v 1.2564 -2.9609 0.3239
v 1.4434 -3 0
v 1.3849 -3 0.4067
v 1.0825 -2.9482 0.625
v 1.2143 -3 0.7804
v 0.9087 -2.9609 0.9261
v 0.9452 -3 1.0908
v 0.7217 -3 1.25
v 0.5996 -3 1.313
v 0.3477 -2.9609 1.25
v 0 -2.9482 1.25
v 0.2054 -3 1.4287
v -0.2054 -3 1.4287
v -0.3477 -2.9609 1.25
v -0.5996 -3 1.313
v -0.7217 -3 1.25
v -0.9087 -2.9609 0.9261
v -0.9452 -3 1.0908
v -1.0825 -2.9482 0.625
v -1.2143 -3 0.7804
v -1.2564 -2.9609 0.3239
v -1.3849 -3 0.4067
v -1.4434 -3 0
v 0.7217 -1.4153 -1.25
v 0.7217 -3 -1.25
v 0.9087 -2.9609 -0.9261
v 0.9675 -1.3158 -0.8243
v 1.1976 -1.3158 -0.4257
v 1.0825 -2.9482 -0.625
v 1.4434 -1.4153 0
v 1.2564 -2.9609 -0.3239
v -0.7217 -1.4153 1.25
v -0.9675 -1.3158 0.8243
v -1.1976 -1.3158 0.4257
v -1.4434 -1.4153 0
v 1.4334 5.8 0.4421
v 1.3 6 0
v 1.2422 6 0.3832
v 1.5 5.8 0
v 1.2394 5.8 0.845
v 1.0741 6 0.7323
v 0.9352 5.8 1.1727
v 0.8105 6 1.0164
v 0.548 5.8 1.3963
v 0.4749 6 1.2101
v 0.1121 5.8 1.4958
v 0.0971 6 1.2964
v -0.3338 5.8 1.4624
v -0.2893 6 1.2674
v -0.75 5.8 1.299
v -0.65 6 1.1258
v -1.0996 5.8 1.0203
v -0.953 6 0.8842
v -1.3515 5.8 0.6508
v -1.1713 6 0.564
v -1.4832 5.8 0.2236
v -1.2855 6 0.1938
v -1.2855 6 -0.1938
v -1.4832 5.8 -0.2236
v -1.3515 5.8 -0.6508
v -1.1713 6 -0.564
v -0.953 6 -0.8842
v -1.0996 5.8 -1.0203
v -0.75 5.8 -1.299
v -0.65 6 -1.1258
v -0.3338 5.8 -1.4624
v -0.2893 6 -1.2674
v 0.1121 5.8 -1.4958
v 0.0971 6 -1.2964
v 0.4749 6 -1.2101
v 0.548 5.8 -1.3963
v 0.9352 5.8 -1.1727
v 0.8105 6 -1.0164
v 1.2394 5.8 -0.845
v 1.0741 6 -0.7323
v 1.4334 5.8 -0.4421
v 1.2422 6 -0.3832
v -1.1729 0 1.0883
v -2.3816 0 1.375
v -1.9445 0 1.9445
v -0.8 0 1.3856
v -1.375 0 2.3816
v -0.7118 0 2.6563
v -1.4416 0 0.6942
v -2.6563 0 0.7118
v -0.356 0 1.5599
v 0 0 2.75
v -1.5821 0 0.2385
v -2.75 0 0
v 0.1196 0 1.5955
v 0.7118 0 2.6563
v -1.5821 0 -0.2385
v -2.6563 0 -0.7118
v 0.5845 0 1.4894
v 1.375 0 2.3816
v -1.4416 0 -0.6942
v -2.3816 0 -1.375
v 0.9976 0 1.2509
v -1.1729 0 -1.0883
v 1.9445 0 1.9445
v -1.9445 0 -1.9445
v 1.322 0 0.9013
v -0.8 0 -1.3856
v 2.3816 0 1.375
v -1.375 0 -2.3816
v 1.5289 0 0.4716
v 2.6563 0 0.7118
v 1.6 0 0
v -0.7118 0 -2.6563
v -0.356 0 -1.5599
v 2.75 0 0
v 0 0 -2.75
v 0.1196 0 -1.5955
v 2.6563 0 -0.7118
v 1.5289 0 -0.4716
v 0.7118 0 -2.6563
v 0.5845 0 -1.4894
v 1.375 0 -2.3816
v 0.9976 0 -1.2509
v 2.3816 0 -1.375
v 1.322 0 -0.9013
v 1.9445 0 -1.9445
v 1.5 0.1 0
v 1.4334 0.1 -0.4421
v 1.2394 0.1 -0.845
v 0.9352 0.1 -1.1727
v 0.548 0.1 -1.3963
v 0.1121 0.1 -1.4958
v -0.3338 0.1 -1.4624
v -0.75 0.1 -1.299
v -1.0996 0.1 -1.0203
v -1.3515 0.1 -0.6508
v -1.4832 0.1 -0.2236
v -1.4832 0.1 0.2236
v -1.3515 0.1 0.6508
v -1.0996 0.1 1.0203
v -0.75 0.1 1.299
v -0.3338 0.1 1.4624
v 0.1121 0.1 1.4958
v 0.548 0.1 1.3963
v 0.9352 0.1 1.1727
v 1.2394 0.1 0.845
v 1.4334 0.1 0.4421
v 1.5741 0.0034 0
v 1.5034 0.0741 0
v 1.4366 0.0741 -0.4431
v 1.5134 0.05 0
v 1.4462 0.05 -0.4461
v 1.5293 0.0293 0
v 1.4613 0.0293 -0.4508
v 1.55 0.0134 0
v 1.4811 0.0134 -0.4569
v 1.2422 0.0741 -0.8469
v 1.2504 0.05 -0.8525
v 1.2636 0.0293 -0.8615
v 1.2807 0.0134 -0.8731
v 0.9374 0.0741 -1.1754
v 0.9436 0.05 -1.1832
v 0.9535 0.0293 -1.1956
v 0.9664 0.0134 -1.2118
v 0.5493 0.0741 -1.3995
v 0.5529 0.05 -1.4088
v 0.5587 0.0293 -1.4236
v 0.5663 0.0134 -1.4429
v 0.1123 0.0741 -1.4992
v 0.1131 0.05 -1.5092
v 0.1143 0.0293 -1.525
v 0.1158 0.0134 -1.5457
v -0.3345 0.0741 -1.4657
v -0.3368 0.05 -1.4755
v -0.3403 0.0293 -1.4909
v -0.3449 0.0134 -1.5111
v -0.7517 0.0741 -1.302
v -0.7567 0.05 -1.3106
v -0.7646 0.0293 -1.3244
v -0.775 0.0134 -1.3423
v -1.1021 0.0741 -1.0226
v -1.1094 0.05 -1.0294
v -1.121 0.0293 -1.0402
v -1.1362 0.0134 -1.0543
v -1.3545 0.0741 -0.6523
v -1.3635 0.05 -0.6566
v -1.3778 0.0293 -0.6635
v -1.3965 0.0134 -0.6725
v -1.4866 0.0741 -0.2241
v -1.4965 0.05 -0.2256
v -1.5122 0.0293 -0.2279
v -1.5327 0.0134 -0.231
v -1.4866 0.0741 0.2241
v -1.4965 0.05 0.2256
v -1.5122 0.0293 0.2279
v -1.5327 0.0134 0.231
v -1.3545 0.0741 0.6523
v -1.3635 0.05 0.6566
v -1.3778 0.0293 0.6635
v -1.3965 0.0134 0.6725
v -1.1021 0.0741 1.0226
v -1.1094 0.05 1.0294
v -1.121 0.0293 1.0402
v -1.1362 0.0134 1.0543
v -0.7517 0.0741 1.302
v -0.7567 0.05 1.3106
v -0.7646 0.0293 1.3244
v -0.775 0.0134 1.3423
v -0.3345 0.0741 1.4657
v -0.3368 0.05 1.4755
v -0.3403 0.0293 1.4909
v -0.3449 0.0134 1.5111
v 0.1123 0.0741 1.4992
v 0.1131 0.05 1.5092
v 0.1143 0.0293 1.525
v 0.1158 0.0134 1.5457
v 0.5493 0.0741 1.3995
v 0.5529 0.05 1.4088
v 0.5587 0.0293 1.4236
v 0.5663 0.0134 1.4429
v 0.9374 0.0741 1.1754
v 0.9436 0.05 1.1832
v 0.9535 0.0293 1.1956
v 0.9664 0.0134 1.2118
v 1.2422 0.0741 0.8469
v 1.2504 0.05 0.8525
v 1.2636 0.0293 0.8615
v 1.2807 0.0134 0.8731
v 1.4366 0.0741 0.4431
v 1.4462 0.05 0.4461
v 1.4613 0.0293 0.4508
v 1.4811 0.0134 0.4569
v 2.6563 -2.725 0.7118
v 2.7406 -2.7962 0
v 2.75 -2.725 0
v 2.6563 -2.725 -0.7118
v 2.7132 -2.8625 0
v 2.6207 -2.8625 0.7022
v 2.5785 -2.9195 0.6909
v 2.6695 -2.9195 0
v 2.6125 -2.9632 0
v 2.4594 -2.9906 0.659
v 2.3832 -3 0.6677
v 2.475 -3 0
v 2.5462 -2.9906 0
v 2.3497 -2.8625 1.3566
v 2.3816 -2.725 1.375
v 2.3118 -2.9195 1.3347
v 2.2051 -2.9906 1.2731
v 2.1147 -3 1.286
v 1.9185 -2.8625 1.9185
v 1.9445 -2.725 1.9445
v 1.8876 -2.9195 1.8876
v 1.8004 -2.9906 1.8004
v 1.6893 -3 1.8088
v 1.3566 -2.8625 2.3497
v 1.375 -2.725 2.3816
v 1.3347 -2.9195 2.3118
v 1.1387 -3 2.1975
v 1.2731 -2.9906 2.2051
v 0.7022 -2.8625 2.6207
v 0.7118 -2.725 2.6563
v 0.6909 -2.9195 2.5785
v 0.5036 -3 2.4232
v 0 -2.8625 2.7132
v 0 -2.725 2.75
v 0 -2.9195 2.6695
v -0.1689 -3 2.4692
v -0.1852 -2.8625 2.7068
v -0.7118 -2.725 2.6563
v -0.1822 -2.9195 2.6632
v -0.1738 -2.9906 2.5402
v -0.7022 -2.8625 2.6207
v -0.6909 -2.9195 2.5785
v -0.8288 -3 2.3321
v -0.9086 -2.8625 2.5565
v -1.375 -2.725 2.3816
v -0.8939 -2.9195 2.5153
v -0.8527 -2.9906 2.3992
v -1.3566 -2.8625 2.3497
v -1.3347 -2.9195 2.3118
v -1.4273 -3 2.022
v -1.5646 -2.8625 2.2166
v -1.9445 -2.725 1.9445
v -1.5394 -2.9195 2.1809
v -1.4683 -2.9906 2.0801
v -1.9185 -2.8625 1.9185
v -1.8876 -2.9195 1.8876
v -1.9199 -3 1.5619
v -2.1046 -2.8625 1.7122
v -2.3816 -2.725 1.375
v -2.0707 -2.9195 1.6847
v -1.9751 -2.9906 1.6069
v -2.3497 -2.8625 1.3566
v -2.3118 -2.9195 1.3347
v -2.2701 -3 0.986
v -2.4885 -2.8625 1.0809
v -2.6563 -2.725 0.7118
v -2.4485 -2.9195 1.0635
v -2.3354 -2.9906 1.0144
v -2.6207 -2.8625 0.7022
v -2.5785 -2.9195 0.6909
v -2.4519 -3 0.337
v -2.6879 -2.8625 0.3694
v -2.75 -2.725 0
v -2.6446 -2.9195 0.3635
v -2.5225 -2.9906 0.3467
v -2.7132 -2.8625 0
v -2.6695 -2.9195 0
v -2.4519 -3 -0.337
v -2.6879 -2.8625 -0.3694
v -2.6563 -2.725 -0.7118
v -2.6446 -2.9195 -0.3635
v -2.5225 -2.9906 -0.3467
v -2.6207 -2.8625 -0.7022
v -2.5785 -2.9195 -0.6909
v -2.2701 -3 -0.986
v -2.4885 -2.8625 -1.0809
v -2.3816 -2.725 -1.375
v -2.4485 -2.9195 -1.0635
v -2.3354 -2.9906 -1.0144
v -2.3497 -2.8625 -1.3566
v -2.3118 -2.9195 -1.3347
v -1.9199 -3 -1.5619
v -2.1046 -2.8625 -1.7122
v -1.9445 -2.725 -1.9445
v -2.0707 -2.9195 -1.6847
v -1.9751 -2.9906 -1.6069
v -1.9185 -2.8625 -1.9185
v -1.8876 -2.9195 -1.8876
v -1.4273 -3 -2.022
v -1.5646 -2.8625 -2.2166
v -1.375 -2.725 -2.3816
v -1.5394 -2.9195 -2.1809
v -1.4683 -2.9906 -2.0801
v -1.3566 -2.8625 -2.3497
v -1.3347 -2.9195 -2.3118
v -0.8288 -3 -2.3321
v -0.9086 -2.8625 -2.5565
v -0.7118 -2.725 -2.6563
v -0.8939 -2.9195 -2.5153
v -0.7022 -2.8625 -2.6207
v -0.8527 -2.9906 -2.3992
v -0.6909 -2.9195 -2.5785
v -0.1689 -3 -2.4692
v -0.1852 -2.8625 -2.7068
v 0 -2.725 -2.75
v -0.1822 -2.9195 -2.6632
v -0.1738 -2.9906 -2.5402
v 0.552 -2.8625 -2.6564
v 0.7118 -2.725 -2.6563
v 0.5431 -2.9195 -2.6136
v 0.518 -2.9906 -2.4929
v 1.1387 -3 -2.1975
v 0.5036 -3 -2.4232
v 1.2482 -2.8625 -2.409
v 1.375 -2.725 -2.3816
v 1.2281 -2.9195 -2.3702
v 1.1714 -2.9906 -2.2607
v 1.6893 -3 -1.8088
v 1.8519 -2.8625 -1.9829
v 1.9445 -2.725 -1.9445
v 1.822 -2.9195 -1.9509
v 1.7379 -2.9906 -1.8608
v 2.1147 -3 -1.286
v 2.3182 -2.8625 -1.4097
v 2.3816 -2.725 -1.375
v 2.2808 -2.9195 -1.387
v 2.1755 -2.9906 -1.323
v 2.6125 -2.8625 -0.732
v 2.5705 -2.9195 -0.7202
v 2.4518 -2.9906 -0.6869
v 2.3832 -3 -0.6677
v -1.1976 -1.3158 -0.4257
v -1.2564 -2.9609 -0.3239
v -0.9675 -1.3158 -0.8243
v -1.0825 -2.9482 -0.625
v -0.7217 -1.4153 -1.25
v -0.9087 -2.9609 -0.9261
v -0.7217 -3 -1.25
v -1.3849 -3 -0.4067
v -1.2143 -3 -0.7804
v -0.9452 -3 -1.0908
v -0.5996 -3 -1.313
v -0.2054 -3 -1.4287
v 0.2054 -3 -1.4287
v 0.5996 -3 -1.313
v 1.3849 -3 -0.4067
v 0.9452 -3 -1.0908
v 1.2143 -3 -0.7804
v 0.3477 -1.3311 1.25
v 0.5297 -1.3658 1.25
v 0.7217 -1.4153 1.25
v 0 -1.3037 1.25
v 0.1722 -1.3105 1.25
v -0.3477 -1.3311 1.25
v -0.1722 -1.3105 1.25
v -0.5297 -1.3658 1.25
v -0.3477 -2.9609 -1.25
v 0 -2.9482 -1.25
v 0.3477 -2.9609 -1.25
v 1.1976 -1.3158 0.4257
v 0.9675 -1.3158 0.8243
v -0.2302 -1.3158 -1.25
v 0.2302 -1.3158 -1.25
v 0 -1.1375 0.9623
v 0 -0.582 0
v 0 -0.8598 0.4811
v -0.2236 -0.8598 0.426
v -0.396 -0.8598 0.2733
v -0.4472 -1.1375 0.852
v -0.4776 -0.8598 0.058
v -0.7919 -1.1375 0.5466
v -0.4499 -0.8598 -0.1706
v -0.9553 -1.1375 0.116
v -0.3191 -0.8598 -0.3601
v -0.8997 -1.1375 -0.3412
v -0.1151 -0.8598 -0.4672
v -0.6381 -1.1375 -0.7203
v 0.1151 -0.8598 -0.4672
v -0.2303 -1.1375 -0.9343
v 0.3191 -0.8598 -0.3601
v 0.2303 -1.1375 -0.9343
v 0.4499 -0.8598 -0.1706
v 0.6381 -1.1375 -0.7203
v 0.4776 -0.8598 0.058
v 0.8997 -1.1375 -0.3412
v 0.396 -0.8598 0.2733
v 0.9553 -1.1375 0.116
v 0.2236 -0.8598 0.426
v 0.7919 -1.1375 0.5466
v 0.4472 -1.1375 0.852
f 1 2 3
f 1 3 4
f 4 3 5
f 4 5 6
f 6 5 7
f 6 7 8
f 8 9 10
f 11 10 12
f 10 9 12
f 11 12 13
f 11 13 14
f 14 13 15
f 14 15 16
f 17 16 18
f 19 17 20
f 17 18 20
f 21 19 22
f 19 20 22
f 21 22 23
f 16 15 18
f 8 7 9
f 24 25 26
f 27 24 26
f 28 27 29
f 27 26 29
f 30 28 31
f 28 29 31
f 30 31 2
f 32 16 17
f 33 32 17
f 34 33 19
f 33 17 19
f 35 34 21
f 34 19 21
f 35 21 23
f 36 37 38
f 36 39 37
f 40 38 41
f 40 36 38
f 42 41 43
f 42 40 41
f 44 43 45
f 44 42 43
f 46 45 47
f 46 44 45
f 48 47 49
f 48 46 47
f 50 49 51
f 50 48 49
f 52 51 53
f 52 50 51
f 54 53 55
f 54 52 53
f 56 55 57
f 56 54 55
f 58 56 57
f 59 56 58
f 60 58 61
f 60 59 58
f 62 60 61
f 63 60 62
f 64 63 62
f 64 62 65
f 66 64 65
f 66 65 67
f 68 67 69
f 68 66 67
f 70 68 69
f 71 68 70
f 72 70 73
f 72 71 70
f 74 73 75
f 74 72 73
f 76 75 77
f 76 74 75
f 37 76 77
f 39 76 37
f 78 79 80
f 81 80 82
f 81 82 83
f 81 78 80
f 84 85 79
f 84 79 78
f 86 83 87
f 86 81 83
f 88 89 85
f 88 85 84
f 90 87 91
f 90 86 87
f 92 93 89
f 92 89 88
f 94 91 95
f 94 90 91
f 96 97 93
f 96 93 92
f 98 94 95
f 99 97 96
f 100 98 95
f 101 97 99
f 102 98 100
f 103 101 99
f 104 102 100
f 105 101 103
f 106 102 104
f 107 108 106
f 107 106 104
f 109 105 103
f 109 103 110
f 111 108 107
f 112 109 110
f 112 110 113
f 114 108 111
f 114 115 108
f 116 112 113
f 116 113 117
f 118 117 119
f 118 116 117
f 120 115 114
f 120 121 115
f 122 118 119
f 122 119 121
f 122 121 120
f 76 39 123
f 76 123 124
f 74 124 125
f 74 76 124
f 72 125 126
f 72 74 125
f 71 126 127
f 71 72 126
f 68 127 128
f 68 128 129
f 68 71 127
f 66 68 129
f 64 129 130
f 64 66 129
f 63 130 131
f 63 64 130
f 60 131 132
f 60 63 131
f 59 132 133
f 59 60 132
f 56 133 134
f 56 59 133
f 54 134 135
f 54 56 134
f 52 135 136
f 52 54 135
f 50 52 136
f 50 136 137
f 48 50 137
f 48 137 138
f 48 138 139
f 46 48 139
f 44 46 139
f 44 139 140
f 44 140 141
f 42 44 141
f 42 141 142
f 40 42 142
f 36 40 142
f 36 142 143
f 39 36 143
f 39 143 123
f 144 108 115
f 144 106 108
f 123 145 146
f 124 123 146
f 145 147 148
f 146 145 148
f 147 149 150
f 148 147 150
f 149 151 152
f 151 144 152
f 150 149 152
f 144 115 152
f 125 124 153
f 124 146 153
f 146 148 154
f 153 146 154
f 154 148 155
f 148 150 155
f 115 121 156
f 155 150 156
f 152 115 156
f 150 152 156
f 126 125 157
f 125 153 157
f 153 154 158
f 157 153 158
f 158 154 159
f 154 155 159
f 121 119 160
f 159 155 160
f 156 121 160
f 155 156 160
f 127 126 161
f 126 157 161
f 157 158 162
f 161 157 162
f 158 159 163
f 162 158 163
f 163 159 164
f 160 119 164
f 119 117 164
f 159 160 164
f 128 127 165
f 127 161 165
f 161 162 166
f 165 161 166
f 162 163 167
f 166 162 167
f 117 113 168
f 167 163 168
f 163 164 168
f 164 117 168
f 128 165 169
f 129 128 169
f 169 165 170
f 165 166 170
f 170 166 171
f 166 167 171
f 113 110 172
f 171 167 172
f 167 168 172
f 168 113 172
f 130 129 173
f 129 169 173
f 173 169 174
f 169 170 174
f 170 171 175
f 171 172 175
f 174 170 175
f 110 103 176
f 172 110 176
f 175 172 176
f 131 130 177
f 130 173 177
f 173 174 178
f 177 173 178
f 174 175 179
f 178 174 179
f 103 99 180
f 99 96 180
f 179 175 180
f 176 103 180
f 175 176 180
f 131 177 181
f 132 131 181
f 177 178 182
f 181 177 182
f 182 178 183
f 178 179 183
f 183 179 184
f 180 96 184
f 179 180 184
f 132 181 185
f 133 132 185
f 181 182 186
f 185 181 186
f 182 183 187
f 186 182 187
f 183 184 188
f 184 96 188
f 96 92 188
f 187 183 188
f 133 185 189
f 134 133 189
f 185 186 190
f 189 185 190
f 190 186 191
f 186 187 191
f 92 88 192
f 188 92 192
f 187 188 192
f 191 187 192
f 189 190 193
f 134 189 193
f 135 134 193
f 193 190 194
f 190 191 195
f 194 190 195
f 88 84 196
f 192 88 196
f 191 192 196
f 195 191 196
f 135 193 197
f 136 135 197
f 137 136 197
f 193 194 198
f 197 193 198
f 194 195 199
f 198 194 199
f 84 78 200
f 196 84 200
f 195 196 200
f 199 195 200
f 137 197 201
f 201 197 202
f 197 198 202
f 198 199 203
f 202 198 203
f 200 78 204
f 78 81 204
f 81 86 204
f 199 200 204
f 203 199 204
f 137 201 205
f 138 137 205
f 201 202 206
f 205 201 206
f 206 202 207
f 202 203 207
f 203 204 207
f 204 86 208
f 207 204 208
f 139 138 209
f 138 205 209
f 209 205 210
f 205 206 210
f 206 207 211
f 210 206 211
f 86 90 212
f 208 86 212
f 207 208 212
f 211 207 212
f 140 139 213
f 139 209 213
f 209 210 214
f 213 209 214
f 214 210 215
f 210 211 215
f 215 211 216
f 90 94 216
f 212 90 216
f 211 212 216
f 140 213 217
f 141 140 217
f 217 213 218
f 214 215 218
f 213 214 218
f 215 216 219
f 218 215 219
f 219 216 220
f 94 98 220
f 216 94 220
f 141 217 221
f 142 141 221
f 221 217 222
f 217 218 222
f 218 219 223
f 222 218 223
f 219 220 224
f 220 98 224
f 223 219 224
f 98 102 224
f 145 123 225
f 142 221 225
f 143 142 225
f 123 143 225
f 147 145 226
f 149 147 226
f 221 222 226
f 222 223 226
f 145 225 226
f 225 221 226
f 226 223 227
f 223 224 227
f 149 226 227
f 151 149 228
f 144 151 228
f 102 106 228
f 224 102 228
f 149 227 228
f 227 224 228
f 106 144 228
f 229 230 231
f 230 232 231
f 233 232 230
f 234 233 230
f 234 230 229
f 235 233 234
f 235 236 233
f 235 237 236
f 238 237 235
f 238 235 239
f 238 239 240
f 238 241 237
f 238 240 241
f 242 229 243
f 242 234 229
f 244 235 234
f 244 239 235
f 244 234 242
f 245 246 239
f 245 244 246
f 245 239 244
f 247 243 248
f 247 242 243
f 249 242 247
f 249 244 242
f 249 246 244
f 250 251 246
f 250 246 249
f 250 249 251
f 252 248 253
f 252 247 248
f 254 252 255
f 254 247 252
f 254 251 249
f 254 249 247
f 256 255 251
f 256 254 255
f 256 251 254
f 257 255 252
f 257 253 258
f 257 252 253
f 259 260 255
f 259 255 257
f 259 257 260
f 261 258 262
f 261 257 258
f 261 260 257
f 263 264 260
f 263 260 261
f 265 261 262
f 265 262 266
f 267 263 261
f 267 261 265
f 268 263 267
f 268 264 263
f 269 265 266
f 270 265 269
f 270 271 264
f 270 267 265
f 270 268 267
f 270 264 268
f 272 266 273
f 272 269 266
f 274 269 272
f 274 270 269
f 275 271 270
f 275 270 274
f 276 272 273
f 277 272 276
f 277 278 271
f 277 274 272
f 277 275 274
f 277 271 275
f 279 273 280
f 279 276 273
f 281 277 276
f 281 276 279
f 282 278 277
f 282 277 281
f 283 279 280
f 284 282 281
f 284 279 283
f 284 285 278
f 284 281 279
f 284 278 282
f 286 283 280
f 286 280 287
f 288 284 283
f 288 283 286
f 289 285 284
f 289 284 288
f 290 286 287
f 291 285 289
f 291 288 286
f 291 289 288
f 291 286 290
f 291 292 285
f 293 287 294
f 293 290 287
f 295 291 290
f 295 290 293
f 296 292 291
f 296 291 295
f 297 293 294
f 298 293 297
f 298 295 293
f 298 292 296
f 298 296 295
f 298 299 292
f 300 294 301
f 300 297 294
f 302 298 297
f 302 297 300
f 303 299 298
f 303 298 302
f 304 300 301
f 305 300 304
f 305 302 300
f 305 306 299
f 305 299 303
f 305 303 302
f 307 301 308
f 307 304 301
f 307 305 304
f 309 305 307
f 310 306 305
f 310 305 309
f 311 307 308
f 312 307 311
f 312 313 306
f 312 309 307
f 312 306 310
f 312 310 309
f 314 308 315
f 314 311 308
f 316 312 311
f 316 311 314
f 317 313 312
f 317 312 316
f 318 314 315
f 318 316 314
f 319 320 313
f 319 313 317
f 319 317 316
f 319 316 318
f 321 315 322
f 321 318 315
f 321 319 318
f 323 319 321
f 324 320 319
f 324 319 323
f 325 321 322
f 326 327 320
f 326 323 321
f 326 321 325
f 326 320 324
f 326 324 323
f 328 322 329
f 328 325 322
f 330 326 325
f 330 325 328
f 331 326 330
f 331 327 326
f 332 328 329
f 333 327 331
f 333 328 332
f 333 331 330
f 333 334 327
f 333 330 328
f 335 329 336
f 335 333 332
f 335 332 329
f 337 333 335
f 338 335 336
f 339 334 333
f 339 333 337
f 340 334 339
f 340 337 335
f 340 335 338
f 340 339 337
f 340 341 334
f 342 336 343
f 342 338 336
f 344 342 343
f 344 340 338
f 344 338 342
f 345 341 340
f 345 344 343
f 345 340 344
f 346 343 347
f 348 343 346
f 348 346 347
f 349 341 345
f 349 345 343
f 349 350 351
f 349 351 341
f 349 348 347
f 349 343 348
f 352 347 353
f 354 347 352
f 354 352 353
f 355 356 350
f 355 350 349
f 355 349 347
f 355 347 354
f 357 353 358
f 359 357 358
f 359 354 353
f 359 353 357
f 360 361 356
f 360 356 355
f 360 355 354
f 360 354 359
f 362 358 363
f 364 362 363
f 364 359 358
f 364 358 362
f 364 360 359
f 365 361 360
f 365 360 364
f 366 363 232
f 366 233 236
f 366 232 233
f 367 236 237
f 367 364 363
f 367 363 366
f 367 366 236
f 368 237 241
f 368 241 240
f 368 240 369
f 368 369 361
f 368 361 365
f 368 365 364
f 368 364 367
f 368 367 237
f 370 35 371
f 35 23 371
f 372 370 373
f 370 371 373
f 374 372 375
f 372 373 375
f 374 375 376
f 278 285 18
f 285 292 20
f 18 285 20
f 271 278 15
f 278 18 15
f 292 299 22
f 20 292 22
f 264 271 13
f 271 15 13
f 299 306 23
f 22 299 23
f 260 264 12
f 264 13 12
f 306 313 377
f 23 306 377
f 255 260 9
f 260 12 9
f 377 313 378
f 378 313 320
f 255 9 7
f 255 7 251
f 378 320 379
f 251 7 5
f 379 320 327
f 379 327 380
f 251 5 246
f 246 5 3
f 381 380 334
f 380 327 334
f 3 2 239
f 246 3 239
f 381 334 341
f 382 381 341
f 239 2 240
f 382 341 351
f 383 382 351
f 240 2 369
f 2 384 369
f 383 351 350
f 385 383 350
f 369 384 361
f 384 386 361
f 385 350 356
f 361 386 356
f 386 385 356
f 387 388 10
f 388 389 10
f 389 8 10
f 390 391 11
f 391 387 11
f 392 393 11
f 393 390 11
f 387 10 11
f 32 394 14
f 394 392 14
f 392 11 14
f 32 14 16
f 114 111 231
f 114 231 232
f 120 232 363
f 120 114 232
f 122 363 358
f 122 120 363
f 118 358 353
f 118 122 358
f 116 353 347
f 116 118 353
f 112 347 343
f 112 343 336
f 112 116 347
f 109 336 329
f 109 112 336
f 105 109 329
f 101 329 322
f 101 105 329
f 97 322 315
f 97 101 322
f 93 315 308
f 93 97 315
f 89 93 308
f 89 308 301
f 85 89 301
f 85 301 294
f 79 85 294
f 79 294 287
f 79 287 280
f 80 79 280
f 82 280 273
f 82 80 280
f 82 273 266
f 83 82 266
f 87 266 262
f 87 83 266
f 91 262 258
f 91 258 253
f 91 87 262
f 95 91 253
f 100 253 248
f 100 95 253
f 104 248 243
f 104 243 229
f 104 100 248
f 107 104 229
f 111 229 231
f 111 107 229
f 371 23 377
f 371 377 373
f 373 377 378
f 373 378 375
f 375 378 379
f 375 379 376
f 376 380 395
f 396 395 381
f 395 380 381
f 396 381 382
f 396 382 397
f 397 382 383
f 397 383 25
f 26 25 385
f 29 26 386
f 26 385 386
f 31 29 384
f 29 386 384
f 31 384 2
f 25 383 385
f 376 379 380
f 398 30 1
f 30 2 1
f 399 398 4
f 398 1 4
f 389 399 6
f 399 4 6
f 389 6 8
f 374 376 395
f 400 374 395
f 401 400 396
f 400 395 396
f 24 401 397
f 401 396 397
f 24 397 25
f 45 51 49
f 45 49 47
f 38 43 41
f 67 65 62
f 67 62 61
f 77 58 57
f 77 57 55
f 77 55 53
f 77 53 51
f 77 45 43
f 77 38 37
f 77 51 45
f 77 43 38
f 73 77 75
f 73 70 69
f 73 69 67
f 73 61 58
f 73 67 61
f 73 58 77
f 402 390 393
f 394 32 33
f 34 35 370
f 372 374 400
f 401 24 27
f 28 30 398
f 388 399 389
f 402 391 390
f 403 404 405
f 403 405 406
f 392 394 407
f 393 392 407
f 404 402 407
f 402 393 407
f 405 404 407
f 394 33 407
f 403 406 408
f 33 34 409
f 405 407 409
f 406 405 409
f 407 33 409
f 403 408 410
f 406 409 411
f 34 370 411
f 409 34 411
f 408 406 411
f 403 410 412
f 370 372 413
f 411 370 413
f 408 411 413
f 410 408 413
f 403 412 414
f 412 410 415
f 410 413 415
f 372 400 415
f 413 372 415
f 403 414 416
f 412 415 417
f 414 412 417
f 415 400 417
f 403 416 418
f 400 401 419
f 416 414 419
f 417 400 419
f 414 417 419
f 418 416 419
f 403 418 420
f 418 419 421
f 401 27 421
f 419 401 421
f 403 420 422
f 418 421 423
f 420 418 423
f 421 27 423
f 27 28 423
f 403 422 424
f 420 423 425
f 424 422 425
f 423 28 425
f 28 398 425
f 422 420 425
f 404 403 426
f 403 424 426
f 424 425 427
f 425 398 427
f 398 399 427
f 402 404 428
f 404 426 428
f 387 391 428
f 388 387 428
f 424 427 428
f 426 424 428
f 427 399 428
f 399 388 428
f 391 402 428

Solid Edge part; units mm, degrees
sketch "Sketch1" plane through (0, 0, 0) normal (0, 0, 1) x (1, 0, 0)
  line L0 (1.5, 0) -> (1.5, 6)
  line L1 (0, 6) -> (1.5, 6)
  line L2 (0, 0) -> (0, 6)
  line L3 (0, 0) -> (0, -3)
  line L4 (0, -3) -> (2.75, -3)
  line L5 (2.75, -3) -> (2.75, 0)
  line L6 (2.75, 0) -> (1.5, 0)
revolve "RevolvedProtrusion1" add sketch "Sketch1" angle 360 about axis through (0, 0, 0) along (0, 1, 0)
sketch "Sketch2" plane through (0, 0, 0) normal (1, 0, 0) x (0, 1, 0)
  line L0 (-3, 1.9365) -> (-1.7, 1.9365)
  line L1 (-0.582, 0) -> (-1.7, 1.9365)
  line L2 (-3, 0) -> (-0.582, 0)
  line L3 (-3, 0) -> (-3, 1.9365)
revolve "RevolvedCutout1" cut sketch "Sketch2" angle 360 about axis through (0, -4.5, 0) along (0, 1, 0)
sketch "Sketch3" plane through (0, -3, 0) normal (0, -1, 0) x (0, 0, 1)
  circle A0 centre (0, 0) radius 1.9365
  line L0 (-1.25, -0.7217) -> (0, -1.4434)
  line L1 (0, -1.4434) -> (1.25, -0.7217)
  line L2 (1.25, -0.7217) -> (1.25, 0.7217)
  line L3 (1.25, 0.7217) -> (0, 1.4434)
  line L4 (0, 1.4434) -> (-1.25, 0.7217)
  line L5 (-1.25, 0.7217) -> (-1.25, -0.7217)
  dimension "D1" = 2.5
extrude "Protrusion1" add sketch "Sketch3" against normal up to next
sketch "Sketch4" plane through (0, 0, 0) normal (0, 0, 1) x (1, 0, 0)
  line L0 (-1.4434, -3) -> (0, -3)
  line L1 (0, -3) -> (0, -2.6132)
  line L2 (0, -2.6132) -> (-1.4434, -3)
revolve "RevolvedCutout2" cut sketch "Sketch4" angle 360 about axis through (0, -4.5, 0) along (0, 1, 0)
fillet "Round1" radius 0.1 1 edges at (0, 0, -1.5)
fillet "Round2" radius 0.275 1 edges at (0, -3, -2.75)
chamfer "倒斜角_2" distance 0.2 angle 45 1 edges at (0, 6, -1.5)
cosmetic_thread "螺纹_3" size "M3" thread depth 4.8
